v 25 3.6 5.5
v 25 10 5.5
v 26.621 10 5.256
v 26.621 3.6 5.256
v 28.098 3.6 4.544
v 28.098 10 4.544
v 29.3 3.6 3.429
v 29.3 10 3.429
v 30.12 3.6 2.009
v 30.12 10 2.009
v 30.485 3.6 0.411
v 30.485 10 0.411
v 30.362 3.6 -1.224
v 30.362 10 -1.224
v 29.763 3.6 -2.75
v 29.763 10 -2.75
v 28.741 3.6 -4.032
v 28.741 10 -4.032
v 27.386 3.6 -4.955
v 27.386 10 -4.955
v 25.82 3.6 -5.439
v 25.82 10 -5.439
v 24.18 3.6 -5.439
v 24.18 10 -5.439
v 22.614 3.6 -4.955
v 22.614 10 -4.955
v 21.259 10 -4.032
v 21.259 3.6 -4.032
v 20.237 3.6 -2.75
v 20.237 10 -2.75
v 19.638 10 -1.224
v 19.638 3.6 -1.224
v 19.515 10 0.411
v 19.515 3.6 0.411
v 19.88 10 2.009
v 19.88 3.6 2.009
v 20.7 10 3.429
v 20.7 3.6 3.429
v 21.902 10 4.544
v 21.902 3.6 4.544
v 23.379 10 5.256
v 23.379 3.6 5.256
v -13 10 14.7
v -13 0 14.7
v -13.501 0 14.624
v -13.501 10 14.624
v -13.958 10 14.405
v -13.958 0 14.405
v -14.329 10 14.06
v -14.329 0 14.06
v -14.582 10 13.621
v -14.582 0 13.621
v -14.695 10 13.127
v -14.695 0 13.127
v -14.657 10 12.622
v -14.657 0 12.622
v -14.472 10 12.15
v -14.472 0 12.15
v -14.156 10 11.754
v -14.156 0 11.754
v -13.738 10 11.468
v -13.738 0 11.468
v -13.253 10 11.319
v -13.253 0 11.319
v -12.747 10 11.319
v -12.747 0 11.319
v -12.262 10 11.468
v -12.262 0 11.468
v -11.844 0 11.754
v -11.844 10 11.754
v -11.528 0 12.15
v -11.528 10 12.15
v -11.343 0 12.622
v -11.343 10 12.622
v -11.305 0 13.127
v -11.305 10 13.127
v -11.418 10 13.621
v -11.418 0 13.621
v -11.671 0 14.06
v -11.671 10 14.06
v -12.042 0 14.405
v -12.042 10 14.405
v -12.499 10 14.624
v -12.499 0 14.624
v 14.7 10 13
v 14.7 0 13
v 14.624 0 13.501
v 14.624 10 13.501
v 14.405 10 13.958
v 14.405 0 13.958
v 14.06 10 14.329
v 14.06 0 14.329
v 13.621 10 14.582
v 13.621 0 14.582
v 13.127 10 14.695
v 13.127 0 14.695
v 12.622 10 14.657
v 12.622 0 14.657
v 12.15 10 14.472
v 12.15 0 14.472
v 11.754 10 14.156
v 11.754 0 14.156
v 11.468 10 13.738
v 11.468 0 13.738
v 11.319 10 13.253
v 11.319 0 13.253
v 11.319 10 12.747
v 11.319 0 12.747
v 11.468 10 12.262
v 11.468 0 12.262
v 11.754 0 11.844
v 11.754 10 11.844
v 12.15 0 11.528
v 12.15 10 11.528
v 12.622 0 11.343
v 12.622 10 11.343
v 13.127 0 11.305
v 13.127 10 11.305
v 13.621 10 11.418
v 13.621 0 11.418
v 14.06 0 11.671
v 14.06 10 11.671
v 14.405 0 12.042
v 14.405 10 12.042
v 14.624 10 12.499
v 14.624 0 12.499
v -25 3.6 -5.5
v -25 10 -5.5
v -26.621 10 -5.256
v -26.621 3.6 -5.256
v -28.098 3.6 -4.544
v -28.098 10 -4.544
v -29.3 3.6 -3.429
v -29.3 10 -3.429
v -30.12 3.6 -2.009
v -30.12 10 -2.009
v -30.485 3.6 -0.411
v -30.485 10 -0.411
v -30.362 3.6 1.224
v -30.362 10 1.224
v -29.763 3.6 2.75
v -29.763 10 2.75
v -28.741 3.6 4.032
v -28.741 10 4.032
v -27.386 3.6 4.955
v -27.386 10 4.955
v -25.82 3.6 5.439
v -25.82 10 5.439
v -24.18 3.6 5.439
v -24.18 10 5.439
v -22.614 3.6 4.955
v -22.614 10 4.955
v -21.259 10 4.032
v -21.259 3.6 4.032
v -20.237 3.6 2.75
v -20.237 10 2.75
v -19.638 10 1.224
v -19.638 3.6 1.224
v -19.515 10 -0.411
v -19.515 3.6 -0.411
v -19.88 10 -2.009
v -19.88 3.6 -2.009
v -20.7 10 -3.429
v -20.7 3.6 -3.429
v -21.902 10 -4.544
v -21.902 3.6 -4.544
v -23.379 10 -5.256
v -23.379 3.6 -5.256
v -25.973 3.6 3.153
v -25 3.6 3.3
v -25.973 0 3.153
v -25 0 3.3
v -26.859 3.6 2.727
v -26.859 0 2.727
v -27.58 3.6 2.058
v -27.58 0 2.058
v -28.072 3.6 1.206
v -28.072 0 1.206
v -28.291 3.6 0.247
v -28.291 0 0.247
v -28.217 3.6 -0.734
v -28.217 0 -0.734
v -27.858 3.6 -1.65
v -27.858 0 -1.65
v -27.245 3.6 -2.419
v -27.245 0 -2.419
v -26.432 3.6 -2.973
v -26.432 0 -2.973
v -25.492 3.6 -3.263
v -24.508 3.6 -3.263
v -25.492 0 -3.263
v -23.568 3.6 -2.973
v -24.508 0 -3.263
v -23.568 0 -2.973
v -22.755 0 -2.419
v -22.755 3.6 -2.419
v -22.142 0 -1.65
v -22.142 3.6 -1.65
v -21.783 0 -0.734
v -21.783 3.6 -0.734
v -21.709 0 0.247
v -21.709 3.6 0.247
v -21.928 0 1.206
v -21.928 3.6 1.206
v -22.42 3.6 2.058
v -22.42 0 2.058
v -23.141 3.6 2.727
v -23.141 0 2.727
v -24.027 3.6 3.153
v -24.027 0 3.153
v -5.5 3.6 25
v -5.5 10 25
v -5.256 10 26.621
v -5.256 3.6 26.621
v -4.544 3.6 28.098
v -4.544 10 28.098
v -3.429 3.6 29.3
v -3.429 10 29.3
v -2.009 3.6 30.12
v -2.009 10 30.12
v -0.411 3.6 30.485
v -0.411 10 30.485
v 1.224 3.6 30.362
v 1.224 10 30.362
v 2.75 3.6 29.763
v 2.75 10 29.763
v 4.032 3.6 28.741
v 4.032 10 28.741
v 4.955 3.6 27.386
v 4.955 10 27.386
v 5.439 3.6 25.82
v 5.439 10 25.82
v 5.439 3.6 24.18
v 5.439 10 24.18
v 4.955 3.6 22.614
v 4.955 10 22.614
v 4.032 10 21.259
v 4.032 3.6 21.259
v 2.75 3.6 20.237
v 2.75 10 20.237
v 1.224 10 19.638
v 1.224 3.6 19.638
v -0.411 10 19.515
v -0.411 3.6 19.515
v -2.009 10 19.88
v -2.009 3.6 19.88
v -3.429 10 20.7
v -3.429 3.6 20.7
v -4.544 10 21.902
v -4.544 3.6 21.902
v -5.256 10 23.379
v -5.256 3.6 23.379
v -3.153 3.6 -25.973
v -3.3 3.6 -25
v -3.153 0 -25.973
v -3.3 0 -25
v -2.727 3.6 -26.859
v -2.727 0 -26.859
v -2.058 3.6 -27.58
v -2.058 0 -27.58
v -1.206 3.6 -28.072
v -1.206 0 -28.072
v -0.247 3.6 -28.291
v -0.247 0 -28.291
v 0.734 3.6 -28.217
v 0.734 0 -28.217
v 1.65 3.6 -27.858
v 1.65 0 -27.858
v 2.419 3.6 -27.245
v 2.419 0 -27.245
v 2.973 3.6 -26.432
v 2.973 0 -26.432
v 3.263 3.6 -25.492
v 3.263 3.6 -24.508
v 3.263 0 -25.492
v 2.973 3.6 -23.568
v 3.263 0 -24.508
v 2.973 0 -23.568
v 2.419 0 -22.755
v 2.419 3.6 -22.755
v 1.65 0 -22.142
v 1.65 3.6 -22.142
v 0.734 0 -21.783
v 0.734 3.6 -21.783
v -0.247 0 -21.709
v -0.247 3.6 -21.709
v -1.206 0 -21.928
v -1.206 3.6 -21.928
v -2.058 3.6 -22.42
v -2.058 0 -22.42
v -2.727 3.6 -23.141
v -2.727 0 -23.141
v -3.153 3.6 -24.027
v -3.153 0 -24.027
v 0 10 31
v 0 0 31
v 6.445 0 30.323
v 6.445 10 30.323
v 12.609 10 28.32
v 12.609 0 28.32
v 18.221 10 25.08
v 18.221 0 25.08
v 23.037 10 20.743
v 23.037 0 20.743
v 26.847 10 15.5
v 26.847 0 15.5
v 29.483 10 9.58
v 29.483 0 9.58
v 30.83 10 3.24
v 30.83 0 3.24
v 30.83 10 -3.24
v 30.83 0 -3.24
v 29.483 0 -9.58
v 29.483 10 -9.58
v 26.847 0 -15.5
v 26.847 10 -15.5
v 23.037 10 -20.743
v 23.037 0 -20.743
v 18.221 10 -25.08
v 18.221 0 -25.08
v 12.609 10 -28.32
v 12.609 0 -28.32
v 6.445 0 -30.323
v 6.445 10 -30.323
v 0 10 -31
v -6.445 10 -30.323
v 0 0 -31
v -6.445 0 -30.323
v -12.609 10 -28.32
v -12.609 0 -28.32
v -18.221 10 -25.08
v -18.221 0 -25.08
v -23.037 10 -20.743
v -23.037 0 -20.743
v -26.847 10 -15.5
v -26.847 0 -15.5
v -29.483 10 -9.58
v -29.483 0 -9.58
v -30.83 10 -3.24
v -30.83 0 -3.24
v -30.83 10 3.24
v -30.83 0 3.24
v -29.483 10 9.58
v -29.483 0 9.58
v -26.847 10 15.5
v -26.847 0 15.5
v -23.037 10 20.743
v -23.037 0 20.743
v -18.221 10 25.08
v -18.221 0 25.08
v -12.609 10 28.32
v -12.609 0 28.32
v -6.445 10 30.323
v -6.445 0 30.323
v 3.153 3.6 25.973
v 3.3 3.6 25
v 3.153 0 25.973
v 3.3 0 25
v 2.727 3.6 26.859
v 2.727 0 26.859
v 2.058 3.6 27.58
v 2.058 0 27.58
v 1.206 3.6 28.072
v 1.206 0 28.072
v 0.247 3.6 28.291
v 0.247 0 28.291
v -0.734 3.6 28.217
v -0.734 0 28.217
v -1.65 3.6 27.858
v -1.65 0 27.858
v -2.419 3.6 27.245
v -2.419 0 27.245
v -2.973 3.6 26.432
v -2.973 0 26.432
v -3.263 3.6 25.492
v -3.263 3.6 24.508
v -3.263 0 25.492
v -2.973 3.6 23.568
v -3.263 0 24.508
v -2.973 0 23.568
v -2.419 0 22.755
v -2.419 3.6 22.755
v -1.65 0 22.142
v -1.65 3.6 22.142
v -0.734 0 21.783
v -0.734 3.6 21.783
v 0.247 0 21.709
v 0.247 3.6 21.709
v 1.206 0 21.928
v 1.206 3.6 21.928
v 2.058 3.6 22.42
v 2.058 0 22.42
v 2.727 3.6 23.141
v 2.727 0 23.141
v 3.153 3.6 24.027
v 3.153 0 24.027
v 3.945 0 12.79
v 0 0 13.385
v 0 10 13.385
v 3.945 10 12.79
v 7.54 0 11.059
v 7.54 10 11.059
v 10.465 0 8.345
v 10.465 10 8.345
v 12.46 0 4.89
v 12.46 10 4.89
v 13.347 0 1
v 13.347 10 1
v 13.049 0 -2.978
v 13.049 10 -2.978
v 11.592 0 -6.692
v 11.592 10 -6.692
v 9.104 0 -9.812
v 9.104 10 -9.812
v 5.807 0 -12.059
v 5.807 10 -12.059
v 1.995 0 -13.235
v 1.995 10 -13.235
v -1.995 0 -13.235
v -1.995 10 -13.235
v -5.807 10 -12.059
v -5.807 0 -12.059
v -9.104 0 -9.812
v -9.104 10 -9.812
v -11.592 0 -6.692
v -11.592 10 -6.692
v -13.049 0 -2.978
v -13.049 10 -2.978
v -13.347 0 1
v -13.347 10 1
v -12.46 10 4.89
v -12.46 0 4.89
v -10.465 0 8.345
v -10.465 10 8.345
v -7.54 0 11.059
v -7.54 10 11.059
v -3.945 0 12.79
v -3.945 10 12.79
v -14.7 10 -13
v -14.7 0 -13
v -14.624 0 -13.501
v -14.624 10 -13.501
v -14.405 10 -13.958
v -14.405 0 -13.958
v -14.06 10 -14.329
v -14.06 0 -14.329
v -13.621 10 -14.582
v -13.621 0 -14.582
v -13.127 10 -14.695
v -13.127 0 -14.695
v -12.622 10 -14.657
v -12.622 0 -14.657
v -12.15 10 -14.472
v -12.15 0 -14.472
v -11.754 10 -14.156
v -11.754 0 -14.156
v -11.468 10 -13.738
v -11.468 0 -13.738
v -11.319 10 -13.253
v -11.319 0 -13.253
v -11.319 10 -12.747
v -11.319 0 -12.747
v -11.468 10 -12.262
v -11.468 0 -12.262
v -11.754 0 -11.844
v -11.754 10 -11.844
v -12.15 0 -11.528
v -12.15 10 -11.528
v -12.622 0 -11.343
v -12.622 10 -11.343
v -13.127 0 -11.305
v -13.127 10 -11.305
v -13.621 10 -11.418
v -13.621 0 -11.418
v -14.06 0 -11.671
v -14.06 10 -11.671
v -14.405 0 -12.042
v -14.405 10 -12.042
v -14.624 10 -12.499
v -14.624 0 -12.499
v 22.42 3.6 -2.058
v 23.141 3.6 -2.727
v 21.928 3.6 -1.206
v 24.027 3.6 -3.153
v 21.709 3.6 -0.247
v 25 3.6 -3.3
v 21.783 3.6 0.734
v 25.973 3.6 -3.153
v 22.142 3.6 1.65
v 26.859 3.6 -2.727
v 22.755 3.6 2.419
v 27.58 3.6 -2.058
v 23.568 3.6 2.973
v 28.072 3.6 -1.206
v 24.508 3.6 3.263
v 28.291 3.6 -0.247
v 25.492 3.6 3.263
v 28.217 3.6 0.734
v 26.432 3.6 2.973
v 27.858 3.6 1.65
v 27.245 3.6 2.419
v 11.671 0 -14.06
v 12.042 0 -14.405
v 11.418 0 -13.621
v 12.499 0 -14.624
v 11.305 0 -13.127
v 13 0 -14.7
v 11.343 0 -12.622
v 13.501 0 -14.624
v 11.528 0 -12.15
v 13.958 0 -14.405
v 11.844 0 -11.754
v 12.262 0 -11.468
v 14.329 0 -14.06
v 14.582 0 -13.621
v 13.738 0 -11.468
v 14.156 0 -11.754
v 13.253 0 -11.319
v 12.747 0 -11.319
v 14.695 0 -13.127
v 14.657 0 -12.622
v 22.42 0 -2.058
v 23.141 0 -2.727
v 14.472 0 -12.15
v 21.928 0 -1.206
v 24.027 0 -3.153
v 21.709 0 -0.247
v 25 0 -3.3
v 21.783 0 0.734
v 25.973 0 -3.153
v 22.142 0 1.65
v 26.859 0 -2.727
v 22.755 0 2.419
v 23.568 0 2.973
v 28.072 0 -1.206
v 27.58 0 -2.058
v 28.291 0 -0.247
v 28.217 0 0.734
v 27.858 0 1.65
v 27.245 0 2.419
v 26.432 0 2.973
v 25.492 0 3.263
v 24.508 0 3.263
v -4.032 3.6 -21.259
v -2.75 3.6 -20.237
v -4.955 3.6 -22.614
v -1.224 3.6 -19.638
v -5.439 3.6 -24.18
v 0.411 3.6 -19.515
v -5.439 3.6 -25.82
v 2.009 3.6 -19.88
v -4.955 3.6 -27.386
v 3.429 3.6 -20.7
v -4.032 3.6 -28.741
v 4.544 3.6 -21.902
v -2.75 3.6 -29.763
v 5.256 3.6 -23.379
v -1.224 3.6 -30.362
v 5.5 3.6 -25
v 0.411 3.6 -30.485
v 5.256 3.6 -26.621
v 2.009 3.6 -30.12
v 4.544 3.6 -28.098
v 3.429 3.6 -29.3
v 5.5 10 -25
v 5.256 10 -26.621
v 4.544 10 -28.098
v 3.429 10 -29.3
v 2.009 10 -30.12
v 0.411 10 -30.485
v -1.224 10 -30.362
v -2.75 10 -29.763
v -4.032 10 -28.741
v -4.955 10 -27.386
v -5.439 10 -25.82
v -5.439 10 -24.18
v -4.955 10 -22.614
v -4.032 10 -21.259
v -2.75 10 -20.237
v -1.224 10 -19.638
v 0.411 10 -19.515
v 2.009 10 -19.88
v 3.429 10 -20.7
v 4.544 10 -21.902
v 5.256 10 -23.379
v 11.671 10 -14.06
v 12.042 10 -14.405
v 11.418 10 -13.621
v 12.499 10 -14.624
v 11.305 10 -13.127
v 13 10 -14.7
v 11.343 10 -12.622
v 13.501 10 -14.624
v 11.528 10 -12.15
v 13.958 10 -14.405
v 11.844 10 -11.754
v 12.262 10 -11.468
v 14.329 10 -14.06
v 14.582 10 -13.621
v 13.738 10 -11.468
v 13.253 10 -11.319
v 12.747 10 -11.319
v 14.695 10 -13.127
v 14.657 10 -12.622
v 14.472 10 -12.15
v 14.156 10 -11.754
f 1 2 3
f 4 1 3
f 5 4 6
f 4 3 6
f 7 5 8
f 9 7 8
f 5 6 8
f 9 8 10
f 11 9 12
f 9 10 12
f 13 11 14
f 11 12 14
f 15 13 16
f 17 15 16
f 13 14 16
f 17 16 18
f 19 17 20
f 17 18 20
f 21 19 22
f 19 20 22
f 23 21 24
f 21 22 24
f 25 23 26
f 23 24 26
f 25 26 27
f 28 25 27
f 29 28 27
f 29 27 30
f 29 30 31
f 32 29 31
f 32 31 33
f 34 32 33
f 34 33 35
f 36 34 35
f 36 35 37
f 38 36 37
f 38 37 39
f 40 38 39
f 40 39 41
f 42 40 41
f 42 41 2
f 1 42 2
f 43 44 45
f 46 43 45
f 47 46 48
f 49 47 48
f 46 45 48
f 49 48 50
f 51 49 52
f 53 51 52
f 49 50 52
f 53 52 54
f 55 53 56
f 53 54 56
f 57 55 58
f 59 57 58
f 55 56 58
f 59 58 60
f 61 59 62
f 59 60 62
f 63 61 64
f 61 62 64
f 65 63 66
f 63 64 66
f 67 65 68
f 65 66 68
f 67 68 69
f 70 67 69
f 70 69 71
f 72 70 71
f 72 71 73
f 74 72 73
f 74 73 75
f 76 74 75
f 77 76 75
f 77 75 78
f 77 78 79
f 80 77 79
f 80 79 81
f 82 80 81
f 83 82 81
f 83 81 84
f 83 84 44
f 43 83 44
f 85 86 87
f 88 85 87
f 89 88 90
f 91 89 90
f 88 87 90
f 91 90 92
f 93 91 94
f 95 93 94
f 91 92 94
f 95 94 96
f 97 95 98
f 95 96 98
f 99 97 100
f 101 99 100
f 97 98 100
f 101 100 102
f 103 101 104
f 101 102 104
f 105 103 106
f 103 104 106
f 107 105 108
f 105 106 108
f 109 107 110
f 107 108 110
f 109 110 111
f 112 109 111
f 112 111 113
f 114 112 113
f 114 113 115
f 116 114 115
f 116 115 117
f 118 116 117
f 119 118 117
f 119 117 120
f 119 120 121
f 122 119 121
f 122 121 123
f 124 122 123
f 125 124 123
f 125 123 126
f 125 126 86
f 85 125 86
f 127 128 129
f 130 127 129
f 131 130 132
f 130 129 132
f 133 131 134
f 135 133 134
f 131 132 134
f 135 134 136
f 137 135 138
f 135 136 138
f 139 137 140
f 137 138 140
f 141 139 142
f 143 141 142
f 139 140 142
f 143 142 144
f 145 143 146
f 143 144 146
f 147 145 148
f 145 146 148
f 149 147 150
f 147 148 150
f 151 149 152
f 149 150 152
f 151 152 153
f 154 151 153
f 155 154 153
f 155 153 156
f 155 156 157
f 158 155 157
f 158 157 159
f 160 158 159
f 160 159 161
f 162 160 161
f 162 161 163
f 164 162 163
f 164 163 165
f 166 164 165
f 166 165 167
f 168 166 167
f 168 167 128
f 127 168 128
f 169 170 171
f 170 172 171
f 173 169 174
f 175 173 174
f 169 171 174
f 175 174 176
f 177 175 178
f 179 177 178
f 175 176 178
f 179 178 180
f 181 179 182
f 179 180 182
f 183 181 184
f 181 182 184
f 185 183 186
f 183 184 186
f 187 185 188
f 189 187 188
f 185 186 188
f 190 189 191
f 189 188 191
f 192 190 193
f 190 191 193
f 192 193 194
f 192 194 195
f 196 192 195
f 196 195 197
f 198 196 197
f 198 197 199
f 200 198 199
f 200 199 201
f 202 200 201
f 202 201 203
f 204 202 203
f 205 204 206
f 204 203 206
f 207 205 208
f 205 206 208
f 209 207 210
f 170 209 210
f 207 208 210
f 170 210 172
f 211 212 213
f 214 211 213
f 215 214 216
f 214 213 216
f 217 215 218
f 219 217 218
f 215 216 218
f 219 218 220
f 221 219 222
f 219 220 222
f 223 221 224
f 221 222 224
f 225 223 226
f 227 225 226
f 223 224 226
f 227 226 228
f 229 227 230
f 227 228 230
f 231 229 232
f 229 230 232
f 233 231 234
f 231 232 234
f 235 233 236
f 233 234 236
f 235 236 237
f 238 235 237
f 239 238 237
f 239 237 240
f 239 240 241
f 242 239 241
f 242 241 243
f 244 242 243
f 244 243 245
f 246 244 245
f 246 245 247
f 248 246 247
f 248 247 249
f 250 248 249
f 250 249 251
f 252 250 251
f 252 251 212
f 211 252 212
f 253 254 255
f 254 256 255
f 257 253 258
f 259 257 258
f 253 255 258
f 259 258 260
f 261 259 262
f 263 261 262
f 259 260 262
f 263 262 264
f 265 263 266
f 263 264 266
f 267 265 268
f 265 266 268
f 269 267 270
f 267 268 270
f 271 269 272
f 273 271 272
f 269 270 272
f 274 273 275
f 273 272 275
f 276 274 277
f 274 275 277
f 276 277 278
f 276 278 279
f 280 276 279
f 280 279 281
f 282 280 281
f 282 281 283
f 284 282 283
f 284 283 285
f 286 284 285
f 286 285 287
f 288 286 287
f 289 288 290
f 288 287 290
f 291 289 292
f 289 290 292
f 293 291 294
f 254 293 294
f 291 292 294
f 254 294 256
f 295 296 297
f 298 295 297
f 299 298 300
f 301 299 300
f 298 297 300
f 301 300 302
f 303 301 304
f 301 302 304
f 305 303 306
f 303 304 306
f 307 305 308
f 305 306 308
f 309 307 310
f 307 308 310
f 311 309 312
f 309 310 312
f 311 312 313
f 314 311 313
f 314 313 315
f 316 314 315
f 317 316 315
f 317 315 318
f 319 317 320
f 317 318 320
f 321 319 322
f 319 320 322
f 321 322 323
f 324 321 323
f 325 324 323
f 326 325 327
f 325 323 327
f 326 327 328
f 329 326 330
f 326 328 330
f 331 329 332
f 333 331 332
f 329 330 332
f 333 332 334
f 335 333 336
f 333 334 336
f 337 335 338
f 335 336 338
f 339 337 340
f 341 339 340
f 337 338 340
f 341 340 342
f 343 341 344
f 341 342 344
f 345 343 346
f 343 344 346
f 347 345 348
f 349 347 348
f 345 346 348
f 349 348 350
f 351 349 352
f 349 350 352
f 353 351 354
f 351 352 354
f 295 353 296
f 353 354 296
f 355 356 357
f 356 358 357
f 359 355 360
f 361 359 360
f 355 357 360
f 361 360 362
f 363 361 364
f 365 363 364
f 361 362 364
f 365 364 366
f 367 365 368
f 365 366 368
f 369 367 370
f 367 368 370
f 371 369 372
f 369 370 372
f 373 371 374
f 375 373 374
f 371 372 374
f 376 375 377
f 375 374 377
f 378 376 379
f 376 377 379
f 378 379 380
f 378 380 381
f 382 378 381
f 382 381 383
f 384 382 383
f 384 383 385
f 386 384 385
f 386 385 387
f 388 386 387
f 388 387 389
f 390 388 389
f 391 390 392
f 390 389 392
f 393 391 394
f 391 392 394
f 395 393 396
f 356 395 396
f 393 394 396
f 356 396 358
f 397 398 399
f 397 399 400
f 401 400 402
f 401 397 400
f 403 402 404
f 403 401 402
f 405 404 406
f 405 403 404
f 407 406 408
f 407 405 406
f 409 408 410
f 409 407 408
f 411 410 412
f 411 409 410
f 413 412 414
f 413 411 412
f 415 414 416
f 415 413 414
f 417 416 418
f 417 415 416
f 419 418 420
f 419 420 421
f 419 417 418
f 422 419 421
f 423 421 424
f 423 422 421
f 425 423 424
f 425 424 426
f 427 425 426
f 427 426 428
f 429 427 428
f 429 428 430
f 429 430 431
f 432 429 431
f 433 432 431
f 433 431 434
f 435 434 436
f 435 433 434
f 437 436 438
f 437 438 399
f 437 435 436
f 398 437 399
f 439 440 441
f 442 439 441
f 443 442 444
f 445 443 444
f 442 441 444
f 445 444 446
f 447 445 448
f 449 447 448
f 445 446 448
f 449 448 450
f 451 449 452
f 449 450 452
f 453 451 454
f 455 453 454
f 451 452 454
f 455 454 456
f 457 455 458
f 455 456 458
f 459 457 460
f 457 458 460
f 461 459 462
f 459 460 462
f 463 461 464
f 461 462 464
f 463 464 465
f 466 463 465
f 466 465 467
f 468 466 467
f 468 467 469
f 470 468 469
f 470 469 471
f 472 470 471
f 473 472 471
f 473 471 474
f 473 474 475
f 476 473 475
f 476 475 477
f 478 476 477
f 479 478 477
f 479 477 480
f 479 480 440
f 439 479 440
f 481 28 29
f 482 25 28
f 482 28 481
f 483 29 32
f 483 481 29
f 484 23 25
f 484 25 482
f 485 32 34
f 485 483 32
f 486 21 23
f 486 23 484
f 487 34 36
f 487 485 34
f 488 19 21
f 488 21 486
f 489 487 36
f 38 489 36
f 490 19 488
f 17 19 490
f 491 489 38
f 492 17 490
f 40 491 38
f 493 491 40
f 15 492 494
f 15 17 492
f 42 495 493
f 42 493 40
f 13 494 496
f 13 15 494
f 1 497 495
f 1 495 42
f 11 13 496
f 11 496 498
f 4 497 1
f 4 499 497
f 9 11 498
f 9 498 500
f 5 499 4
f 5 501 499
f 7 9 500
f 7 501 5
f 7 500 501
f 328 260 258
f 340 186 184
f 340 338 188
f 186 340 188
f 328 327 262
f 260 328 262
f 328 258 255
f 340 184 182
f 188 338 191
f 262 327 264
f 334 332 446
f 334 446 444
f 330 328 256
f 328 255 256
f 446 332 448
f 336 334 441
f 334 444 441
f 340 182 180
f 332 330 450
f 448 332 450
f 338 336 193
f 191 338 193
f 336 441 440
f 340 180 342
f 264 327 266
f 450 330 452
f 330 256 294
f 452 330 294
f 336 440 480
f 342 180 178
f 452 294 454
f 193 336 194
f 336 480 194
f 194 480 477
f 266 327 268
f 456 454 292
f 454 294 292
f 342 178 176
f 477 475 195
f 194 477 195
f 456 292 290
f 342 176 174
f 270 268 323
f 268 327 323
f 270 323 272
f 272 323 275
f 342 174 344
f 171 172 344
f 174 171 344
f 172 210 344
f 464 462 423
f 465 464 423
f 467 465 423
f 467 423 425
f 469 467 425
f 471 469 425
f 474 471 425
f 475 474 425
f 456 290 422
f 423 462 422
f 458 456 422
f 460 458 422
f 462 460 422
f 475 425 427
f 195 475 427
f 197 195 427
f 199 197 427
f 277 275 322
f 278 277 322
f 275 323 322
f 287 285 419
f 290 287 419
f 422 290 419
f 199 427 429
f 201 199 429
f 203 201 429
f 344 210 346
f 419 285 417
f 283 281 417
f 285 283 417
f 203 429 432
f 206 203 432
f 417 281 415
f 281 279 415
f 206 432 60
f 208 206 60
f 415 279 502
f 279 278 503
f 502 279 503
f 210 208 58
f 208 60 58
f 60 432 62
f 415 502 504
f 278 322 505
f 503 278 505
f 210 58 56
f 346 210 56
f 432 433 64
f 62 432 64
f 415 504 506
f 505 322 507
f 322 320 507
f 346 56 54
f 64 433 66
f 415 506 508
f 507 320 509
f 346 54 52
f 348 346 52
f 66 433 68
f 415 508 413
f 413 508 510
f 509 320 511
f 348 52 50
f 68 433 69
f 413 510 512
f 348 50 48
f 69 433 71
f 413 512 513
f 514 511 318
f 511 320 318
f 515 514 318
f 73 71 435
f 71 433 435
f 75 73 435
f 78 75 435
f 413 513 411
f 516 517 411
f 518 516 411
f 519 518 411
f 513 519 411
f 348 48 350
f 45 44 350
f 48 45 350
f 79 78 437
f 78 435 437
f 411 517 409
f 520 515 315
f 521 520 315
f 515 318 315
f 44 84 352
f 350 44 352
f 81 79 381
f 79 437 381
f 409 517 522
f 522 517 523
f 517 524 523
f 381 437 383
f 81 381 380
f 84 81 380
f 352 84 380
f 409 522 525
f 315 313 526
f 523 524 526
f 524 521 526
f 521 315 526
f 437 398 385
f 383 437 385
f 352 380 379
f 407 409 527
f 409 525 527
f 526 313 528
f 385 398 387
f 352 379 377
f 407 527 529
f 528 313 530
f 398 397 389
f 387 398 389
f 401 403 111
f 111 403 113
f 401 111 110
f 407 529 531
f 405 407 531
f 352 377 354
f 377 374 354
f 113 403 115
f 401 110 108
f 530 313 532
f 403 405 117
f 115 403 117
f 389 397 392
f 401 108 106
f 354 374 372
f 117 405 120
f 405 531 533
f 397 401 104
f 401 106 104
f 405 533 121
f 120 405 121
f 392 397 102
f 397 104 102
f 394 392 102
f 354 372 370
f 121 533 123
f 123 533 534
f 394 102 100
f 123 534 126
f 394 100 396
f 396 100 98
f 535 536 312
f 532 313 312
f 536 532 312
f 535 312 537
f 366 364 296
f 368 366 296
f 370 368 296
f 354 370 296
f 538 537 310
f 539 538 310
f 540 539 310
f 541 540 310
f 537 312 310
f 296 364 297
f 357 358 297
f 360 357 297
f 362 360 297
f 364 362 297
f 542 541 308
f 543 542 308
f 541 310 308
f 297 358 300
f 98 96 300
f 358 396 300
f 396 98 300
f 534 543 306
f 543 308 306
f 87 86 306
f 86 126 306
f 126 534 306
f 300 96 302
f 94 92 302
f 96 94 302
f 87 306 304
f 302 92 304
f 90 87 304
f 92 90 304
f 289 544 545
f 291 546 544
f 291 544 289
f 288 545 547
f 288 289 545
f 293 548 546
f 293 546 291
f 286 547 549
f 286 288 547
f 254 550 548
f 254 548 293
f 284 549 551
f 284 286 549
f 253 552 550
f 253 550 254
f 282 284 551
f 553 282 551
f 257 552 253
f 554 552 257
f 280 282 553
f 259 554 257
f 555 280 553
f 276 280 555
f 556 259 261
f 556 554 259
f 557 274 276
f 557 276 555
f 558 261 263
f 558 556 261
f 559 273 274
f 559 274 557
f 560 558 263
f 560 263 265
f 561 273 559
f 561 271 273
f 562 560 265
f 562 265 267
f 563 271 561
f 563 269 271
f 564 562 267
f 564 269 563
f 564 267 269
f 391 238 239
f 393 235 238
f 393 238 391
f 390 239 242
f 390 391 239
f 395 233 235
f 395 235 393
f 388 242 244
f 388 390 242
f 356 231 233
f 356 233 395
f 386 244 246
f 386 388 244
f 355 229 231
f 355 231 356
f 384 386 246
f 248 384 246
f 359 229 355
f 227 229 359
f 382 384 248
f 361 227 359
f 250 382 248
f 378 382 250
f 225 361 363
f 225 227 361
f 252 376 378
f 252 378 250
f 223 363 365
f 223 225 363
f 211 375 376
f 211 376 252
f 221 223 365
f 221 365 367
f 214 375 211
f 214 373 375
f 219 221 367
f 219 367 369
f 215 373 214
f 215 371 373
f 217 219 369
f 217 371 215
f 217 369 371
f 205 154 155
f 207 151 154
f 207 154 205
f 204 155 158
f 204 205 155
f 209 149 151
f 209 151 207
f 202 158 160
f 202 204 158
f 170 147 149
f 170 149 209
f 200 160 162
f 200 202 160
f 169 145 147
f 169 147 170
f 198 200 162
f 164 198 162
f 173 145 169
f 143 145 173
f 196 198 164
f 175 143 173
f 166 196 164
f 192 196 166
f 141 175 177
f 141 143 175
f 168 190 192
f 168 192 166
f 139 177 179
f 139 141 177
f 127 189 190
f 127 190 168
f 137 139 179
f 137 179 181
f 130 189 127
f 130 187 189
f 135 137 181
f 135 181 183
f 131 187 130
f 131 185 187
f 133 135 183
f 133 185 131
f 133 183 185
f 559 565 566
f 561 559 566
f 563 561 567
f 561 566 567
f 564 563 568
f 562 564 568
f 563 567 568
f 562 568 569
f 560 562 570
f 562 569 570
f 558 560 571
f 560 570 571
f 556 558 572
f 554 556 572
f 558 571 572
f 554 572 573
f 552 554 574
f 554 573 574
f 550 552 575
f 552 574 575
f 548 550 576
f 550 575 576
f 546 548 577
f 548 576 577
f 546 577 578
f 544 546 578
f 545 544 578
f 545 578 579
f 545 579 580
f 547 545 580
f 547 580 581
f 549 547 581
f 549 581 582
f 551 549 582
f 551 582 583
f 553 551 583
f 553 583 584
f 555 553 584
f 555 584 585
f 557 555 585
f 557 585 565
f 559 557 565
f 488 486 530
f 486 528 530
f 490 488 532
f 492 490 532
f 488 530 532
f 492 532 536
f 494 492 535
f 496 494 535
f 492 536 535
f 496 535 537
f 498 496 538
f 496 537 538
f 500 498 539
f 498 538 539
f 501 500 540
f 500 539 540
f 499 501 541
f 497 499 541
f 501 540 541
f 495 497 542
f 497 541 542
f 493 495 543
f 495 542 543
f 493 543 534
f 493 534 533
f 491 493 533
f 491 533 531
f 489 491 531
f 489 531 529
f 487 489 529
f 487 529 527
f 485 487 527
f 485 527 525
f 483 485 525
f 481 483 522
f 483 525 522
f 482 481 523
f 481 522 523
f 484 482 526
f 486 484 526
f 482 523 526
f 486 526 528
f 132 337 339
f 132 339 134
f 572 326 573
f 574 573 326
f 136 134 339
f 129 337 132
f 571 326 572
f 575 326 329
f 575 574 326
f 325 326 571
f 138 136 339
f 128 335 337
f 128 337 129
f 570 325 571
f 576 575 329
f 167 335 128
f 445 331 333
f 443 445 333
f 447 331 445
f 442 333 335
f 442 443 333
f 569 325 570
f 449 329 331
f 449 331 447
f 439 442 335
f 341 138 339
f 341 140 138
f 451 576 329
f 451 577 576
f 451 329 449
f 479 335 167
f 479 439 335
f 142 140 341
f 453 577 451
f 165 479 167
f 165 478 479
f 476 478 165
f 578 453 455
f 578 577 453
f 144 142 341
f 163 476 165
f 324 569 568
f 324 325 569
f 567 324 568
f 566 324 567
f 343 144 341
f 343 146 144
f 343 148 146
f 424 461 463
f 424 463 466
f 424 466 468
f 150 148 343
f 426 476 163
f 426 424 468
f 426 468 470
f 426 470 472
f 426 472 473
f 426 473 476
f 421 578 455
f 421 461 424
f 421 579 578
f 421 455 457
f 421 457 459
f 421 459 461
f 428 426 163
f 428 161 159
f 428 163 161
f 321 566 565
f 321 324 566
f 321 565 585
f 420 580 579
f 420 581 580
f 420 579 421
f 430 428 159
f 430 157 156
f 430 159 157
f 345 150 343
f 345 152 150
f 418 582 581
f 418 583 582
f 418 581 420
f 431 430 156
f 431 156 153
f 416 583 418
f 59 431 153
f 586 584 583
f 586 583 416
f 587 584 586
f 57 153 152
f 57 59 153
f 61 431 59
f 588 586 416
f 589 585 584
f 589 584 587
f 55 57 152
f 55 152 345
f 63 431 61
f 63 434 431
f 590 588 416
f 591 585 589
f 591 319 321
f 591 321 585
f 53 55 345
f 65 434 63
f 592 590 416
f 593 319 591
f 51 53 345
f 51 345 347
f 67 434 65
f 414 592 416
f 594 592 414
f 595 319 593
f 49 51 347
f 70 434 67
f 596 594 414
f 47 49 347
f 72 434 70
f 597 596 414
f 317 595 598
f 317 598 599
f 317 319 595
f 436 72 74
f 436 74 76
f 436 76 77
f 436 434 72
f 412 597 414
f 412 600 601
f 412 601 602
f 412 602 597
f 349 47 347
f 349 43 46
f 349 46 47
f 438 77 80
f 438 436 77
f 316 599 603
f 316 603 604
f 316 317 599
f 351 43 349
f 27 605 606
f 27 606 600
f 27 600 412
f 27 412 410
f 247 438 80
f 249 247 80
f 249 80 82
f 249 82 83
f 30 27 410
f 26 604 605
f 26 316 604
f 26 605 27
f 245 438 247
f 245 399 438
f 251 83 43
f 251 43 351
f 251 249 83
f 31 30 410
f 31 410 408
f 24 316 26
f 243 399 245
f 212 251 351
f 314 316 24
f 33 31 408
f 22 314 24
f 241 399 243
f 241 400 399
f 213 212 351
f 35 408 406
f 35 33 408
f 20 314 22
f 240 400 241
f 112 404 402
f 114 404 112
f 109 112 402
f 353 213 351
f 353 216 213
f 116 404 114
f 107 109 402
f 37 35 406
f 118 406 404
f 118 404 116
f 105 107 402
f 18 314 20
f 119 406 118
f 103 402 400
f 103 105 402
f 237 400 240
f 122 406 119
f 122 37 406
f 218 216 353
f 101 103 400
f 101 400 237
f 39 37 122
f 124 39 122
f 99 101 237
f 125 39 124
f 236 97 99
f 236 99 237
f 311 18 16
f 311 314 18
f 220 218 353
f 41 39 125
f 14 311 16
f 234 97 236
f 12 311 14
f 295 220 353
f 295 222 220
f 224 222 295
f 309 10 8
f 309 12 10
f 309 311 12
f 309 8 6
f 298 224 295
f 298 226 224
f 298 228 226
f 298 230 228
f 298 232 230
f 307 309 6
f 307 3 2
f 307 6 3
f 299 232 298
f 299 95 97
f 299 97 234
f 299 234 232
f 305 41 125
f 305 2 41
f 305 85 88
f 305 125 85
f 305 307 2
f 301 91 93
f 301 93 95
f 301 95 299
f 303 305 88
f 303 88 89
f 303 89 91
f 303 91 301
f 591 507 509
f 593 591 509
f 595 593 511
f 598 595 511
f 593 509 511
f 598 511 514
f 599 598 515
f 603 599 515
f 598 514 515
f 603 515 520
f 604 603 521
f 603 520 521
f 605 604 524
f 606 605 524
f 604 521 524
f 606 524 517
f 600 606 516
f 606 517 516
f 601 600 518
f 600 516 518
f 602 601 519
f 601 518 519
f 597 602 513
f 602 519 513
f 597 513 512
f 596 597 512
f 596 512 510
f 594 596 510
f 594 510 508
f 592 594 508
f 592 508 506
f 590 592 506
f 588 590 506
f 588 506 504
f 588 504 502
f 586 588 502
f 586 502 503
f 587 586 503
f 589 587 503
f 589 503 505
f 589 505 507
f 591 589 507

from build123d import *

# Parameters (mm, degrees)
SKETCH1_R                                           = 31
SKETCH1_R_2                                         = 13.384776311
BOSS_EXTRUDE1_DEPTH                                 = 10
CBORE_FOR_M6_HEX_SOCKET_HEAD_CAP_SCREW1_D           = 6.6
CBORE_FOR_M6_HEX_SOCKET_HEAD_CAP_SCREW1_CBORE_D     = 11
CBORE_FOR_M6_HEX_SOCKET_HEAD_CAP_SCREW1_CBORE_DEPTH = 6.4
M3_CLEARANCE_HOLE1_D                                = 3.4
CIRPATTERN1_COUNT                                   = 4


with BuildPart() as part:
    # Sketch1 → Boss-Extrude1 (new body)
    with BuildSketch(Plane(origin=(0, 0, 0), x_dir=(1, 0, 0), z_dir=(0, 1, 0))):
        with Locations(Location((0, 0, 0), (0, 0, 270))):
            Circle(SKETCH1_R)
        with Locations(Location((0, 0, 0), (0, 0, 270))):
            Circle(SKETCH1_R_2, mode=Mode.SUBTRACT)
    extrude(amount=BOSS_EXTRUDE1_DEPTH)

    # CBORE for M6 Hex Socket Head Cap Screw1 (through all)
    with Locations(Plane(origin=(0, 10, 0), x_dir=(1, 0, 0), z_dir=(0, 1, 0))):
        with Locations((0, 25)):
            cbore_for_m6_hex_socket_head_cap_screw1 = CounterBoreHole(CBORE_FOR_M6_HEX_SOCKET_HEAD_CAP_SCREW1_D / 2, CBORE_FOR_M6_HEX_SOCKET_HEAD_CAP_SCREW1_CBORE_D / 2, CBORE_FOR_M6_HEX_SOCKET_HEAD_CAP_SCREW1_CBORE_DEPTH)

    # M3 Clearance Hole1 (through all)
    with Locations(Plane(origin=(0, 10, 0), x_dir=(1, 0, 0), z_dir=(0, 1, 0))):
        with Locations((-13, 13)):
            m3_clearance_hole1 = Hole(M3_CLEARANCE_HOLE1_D / 2)

    # CirPattern1: CBORE for M6 Hex Socket Head Cap Screw1, M3 Clearance Hole1 ×4 about axis
    cirpattern1_axis = Axis((0, 0, 0), (0, 1, 0))
    add([cbore_for_m6_hex_socket_head_cap_screw1.rotate(cirpattern1_axis, i * 360 / CIRPATTERN1_COUNT) for i in range(1, CIRPATTERN1_COUNT)], mode=Mode.SUBTRACT)
    add([m3_clearance_hole1.rotate(cirpattern1_axis, i * 360 / CIRPATTERN1_COUNT) for i in range(1, CIRPATTERN1_COUNT)], mode=Mode.SUBTRACT)


solid = part.part
